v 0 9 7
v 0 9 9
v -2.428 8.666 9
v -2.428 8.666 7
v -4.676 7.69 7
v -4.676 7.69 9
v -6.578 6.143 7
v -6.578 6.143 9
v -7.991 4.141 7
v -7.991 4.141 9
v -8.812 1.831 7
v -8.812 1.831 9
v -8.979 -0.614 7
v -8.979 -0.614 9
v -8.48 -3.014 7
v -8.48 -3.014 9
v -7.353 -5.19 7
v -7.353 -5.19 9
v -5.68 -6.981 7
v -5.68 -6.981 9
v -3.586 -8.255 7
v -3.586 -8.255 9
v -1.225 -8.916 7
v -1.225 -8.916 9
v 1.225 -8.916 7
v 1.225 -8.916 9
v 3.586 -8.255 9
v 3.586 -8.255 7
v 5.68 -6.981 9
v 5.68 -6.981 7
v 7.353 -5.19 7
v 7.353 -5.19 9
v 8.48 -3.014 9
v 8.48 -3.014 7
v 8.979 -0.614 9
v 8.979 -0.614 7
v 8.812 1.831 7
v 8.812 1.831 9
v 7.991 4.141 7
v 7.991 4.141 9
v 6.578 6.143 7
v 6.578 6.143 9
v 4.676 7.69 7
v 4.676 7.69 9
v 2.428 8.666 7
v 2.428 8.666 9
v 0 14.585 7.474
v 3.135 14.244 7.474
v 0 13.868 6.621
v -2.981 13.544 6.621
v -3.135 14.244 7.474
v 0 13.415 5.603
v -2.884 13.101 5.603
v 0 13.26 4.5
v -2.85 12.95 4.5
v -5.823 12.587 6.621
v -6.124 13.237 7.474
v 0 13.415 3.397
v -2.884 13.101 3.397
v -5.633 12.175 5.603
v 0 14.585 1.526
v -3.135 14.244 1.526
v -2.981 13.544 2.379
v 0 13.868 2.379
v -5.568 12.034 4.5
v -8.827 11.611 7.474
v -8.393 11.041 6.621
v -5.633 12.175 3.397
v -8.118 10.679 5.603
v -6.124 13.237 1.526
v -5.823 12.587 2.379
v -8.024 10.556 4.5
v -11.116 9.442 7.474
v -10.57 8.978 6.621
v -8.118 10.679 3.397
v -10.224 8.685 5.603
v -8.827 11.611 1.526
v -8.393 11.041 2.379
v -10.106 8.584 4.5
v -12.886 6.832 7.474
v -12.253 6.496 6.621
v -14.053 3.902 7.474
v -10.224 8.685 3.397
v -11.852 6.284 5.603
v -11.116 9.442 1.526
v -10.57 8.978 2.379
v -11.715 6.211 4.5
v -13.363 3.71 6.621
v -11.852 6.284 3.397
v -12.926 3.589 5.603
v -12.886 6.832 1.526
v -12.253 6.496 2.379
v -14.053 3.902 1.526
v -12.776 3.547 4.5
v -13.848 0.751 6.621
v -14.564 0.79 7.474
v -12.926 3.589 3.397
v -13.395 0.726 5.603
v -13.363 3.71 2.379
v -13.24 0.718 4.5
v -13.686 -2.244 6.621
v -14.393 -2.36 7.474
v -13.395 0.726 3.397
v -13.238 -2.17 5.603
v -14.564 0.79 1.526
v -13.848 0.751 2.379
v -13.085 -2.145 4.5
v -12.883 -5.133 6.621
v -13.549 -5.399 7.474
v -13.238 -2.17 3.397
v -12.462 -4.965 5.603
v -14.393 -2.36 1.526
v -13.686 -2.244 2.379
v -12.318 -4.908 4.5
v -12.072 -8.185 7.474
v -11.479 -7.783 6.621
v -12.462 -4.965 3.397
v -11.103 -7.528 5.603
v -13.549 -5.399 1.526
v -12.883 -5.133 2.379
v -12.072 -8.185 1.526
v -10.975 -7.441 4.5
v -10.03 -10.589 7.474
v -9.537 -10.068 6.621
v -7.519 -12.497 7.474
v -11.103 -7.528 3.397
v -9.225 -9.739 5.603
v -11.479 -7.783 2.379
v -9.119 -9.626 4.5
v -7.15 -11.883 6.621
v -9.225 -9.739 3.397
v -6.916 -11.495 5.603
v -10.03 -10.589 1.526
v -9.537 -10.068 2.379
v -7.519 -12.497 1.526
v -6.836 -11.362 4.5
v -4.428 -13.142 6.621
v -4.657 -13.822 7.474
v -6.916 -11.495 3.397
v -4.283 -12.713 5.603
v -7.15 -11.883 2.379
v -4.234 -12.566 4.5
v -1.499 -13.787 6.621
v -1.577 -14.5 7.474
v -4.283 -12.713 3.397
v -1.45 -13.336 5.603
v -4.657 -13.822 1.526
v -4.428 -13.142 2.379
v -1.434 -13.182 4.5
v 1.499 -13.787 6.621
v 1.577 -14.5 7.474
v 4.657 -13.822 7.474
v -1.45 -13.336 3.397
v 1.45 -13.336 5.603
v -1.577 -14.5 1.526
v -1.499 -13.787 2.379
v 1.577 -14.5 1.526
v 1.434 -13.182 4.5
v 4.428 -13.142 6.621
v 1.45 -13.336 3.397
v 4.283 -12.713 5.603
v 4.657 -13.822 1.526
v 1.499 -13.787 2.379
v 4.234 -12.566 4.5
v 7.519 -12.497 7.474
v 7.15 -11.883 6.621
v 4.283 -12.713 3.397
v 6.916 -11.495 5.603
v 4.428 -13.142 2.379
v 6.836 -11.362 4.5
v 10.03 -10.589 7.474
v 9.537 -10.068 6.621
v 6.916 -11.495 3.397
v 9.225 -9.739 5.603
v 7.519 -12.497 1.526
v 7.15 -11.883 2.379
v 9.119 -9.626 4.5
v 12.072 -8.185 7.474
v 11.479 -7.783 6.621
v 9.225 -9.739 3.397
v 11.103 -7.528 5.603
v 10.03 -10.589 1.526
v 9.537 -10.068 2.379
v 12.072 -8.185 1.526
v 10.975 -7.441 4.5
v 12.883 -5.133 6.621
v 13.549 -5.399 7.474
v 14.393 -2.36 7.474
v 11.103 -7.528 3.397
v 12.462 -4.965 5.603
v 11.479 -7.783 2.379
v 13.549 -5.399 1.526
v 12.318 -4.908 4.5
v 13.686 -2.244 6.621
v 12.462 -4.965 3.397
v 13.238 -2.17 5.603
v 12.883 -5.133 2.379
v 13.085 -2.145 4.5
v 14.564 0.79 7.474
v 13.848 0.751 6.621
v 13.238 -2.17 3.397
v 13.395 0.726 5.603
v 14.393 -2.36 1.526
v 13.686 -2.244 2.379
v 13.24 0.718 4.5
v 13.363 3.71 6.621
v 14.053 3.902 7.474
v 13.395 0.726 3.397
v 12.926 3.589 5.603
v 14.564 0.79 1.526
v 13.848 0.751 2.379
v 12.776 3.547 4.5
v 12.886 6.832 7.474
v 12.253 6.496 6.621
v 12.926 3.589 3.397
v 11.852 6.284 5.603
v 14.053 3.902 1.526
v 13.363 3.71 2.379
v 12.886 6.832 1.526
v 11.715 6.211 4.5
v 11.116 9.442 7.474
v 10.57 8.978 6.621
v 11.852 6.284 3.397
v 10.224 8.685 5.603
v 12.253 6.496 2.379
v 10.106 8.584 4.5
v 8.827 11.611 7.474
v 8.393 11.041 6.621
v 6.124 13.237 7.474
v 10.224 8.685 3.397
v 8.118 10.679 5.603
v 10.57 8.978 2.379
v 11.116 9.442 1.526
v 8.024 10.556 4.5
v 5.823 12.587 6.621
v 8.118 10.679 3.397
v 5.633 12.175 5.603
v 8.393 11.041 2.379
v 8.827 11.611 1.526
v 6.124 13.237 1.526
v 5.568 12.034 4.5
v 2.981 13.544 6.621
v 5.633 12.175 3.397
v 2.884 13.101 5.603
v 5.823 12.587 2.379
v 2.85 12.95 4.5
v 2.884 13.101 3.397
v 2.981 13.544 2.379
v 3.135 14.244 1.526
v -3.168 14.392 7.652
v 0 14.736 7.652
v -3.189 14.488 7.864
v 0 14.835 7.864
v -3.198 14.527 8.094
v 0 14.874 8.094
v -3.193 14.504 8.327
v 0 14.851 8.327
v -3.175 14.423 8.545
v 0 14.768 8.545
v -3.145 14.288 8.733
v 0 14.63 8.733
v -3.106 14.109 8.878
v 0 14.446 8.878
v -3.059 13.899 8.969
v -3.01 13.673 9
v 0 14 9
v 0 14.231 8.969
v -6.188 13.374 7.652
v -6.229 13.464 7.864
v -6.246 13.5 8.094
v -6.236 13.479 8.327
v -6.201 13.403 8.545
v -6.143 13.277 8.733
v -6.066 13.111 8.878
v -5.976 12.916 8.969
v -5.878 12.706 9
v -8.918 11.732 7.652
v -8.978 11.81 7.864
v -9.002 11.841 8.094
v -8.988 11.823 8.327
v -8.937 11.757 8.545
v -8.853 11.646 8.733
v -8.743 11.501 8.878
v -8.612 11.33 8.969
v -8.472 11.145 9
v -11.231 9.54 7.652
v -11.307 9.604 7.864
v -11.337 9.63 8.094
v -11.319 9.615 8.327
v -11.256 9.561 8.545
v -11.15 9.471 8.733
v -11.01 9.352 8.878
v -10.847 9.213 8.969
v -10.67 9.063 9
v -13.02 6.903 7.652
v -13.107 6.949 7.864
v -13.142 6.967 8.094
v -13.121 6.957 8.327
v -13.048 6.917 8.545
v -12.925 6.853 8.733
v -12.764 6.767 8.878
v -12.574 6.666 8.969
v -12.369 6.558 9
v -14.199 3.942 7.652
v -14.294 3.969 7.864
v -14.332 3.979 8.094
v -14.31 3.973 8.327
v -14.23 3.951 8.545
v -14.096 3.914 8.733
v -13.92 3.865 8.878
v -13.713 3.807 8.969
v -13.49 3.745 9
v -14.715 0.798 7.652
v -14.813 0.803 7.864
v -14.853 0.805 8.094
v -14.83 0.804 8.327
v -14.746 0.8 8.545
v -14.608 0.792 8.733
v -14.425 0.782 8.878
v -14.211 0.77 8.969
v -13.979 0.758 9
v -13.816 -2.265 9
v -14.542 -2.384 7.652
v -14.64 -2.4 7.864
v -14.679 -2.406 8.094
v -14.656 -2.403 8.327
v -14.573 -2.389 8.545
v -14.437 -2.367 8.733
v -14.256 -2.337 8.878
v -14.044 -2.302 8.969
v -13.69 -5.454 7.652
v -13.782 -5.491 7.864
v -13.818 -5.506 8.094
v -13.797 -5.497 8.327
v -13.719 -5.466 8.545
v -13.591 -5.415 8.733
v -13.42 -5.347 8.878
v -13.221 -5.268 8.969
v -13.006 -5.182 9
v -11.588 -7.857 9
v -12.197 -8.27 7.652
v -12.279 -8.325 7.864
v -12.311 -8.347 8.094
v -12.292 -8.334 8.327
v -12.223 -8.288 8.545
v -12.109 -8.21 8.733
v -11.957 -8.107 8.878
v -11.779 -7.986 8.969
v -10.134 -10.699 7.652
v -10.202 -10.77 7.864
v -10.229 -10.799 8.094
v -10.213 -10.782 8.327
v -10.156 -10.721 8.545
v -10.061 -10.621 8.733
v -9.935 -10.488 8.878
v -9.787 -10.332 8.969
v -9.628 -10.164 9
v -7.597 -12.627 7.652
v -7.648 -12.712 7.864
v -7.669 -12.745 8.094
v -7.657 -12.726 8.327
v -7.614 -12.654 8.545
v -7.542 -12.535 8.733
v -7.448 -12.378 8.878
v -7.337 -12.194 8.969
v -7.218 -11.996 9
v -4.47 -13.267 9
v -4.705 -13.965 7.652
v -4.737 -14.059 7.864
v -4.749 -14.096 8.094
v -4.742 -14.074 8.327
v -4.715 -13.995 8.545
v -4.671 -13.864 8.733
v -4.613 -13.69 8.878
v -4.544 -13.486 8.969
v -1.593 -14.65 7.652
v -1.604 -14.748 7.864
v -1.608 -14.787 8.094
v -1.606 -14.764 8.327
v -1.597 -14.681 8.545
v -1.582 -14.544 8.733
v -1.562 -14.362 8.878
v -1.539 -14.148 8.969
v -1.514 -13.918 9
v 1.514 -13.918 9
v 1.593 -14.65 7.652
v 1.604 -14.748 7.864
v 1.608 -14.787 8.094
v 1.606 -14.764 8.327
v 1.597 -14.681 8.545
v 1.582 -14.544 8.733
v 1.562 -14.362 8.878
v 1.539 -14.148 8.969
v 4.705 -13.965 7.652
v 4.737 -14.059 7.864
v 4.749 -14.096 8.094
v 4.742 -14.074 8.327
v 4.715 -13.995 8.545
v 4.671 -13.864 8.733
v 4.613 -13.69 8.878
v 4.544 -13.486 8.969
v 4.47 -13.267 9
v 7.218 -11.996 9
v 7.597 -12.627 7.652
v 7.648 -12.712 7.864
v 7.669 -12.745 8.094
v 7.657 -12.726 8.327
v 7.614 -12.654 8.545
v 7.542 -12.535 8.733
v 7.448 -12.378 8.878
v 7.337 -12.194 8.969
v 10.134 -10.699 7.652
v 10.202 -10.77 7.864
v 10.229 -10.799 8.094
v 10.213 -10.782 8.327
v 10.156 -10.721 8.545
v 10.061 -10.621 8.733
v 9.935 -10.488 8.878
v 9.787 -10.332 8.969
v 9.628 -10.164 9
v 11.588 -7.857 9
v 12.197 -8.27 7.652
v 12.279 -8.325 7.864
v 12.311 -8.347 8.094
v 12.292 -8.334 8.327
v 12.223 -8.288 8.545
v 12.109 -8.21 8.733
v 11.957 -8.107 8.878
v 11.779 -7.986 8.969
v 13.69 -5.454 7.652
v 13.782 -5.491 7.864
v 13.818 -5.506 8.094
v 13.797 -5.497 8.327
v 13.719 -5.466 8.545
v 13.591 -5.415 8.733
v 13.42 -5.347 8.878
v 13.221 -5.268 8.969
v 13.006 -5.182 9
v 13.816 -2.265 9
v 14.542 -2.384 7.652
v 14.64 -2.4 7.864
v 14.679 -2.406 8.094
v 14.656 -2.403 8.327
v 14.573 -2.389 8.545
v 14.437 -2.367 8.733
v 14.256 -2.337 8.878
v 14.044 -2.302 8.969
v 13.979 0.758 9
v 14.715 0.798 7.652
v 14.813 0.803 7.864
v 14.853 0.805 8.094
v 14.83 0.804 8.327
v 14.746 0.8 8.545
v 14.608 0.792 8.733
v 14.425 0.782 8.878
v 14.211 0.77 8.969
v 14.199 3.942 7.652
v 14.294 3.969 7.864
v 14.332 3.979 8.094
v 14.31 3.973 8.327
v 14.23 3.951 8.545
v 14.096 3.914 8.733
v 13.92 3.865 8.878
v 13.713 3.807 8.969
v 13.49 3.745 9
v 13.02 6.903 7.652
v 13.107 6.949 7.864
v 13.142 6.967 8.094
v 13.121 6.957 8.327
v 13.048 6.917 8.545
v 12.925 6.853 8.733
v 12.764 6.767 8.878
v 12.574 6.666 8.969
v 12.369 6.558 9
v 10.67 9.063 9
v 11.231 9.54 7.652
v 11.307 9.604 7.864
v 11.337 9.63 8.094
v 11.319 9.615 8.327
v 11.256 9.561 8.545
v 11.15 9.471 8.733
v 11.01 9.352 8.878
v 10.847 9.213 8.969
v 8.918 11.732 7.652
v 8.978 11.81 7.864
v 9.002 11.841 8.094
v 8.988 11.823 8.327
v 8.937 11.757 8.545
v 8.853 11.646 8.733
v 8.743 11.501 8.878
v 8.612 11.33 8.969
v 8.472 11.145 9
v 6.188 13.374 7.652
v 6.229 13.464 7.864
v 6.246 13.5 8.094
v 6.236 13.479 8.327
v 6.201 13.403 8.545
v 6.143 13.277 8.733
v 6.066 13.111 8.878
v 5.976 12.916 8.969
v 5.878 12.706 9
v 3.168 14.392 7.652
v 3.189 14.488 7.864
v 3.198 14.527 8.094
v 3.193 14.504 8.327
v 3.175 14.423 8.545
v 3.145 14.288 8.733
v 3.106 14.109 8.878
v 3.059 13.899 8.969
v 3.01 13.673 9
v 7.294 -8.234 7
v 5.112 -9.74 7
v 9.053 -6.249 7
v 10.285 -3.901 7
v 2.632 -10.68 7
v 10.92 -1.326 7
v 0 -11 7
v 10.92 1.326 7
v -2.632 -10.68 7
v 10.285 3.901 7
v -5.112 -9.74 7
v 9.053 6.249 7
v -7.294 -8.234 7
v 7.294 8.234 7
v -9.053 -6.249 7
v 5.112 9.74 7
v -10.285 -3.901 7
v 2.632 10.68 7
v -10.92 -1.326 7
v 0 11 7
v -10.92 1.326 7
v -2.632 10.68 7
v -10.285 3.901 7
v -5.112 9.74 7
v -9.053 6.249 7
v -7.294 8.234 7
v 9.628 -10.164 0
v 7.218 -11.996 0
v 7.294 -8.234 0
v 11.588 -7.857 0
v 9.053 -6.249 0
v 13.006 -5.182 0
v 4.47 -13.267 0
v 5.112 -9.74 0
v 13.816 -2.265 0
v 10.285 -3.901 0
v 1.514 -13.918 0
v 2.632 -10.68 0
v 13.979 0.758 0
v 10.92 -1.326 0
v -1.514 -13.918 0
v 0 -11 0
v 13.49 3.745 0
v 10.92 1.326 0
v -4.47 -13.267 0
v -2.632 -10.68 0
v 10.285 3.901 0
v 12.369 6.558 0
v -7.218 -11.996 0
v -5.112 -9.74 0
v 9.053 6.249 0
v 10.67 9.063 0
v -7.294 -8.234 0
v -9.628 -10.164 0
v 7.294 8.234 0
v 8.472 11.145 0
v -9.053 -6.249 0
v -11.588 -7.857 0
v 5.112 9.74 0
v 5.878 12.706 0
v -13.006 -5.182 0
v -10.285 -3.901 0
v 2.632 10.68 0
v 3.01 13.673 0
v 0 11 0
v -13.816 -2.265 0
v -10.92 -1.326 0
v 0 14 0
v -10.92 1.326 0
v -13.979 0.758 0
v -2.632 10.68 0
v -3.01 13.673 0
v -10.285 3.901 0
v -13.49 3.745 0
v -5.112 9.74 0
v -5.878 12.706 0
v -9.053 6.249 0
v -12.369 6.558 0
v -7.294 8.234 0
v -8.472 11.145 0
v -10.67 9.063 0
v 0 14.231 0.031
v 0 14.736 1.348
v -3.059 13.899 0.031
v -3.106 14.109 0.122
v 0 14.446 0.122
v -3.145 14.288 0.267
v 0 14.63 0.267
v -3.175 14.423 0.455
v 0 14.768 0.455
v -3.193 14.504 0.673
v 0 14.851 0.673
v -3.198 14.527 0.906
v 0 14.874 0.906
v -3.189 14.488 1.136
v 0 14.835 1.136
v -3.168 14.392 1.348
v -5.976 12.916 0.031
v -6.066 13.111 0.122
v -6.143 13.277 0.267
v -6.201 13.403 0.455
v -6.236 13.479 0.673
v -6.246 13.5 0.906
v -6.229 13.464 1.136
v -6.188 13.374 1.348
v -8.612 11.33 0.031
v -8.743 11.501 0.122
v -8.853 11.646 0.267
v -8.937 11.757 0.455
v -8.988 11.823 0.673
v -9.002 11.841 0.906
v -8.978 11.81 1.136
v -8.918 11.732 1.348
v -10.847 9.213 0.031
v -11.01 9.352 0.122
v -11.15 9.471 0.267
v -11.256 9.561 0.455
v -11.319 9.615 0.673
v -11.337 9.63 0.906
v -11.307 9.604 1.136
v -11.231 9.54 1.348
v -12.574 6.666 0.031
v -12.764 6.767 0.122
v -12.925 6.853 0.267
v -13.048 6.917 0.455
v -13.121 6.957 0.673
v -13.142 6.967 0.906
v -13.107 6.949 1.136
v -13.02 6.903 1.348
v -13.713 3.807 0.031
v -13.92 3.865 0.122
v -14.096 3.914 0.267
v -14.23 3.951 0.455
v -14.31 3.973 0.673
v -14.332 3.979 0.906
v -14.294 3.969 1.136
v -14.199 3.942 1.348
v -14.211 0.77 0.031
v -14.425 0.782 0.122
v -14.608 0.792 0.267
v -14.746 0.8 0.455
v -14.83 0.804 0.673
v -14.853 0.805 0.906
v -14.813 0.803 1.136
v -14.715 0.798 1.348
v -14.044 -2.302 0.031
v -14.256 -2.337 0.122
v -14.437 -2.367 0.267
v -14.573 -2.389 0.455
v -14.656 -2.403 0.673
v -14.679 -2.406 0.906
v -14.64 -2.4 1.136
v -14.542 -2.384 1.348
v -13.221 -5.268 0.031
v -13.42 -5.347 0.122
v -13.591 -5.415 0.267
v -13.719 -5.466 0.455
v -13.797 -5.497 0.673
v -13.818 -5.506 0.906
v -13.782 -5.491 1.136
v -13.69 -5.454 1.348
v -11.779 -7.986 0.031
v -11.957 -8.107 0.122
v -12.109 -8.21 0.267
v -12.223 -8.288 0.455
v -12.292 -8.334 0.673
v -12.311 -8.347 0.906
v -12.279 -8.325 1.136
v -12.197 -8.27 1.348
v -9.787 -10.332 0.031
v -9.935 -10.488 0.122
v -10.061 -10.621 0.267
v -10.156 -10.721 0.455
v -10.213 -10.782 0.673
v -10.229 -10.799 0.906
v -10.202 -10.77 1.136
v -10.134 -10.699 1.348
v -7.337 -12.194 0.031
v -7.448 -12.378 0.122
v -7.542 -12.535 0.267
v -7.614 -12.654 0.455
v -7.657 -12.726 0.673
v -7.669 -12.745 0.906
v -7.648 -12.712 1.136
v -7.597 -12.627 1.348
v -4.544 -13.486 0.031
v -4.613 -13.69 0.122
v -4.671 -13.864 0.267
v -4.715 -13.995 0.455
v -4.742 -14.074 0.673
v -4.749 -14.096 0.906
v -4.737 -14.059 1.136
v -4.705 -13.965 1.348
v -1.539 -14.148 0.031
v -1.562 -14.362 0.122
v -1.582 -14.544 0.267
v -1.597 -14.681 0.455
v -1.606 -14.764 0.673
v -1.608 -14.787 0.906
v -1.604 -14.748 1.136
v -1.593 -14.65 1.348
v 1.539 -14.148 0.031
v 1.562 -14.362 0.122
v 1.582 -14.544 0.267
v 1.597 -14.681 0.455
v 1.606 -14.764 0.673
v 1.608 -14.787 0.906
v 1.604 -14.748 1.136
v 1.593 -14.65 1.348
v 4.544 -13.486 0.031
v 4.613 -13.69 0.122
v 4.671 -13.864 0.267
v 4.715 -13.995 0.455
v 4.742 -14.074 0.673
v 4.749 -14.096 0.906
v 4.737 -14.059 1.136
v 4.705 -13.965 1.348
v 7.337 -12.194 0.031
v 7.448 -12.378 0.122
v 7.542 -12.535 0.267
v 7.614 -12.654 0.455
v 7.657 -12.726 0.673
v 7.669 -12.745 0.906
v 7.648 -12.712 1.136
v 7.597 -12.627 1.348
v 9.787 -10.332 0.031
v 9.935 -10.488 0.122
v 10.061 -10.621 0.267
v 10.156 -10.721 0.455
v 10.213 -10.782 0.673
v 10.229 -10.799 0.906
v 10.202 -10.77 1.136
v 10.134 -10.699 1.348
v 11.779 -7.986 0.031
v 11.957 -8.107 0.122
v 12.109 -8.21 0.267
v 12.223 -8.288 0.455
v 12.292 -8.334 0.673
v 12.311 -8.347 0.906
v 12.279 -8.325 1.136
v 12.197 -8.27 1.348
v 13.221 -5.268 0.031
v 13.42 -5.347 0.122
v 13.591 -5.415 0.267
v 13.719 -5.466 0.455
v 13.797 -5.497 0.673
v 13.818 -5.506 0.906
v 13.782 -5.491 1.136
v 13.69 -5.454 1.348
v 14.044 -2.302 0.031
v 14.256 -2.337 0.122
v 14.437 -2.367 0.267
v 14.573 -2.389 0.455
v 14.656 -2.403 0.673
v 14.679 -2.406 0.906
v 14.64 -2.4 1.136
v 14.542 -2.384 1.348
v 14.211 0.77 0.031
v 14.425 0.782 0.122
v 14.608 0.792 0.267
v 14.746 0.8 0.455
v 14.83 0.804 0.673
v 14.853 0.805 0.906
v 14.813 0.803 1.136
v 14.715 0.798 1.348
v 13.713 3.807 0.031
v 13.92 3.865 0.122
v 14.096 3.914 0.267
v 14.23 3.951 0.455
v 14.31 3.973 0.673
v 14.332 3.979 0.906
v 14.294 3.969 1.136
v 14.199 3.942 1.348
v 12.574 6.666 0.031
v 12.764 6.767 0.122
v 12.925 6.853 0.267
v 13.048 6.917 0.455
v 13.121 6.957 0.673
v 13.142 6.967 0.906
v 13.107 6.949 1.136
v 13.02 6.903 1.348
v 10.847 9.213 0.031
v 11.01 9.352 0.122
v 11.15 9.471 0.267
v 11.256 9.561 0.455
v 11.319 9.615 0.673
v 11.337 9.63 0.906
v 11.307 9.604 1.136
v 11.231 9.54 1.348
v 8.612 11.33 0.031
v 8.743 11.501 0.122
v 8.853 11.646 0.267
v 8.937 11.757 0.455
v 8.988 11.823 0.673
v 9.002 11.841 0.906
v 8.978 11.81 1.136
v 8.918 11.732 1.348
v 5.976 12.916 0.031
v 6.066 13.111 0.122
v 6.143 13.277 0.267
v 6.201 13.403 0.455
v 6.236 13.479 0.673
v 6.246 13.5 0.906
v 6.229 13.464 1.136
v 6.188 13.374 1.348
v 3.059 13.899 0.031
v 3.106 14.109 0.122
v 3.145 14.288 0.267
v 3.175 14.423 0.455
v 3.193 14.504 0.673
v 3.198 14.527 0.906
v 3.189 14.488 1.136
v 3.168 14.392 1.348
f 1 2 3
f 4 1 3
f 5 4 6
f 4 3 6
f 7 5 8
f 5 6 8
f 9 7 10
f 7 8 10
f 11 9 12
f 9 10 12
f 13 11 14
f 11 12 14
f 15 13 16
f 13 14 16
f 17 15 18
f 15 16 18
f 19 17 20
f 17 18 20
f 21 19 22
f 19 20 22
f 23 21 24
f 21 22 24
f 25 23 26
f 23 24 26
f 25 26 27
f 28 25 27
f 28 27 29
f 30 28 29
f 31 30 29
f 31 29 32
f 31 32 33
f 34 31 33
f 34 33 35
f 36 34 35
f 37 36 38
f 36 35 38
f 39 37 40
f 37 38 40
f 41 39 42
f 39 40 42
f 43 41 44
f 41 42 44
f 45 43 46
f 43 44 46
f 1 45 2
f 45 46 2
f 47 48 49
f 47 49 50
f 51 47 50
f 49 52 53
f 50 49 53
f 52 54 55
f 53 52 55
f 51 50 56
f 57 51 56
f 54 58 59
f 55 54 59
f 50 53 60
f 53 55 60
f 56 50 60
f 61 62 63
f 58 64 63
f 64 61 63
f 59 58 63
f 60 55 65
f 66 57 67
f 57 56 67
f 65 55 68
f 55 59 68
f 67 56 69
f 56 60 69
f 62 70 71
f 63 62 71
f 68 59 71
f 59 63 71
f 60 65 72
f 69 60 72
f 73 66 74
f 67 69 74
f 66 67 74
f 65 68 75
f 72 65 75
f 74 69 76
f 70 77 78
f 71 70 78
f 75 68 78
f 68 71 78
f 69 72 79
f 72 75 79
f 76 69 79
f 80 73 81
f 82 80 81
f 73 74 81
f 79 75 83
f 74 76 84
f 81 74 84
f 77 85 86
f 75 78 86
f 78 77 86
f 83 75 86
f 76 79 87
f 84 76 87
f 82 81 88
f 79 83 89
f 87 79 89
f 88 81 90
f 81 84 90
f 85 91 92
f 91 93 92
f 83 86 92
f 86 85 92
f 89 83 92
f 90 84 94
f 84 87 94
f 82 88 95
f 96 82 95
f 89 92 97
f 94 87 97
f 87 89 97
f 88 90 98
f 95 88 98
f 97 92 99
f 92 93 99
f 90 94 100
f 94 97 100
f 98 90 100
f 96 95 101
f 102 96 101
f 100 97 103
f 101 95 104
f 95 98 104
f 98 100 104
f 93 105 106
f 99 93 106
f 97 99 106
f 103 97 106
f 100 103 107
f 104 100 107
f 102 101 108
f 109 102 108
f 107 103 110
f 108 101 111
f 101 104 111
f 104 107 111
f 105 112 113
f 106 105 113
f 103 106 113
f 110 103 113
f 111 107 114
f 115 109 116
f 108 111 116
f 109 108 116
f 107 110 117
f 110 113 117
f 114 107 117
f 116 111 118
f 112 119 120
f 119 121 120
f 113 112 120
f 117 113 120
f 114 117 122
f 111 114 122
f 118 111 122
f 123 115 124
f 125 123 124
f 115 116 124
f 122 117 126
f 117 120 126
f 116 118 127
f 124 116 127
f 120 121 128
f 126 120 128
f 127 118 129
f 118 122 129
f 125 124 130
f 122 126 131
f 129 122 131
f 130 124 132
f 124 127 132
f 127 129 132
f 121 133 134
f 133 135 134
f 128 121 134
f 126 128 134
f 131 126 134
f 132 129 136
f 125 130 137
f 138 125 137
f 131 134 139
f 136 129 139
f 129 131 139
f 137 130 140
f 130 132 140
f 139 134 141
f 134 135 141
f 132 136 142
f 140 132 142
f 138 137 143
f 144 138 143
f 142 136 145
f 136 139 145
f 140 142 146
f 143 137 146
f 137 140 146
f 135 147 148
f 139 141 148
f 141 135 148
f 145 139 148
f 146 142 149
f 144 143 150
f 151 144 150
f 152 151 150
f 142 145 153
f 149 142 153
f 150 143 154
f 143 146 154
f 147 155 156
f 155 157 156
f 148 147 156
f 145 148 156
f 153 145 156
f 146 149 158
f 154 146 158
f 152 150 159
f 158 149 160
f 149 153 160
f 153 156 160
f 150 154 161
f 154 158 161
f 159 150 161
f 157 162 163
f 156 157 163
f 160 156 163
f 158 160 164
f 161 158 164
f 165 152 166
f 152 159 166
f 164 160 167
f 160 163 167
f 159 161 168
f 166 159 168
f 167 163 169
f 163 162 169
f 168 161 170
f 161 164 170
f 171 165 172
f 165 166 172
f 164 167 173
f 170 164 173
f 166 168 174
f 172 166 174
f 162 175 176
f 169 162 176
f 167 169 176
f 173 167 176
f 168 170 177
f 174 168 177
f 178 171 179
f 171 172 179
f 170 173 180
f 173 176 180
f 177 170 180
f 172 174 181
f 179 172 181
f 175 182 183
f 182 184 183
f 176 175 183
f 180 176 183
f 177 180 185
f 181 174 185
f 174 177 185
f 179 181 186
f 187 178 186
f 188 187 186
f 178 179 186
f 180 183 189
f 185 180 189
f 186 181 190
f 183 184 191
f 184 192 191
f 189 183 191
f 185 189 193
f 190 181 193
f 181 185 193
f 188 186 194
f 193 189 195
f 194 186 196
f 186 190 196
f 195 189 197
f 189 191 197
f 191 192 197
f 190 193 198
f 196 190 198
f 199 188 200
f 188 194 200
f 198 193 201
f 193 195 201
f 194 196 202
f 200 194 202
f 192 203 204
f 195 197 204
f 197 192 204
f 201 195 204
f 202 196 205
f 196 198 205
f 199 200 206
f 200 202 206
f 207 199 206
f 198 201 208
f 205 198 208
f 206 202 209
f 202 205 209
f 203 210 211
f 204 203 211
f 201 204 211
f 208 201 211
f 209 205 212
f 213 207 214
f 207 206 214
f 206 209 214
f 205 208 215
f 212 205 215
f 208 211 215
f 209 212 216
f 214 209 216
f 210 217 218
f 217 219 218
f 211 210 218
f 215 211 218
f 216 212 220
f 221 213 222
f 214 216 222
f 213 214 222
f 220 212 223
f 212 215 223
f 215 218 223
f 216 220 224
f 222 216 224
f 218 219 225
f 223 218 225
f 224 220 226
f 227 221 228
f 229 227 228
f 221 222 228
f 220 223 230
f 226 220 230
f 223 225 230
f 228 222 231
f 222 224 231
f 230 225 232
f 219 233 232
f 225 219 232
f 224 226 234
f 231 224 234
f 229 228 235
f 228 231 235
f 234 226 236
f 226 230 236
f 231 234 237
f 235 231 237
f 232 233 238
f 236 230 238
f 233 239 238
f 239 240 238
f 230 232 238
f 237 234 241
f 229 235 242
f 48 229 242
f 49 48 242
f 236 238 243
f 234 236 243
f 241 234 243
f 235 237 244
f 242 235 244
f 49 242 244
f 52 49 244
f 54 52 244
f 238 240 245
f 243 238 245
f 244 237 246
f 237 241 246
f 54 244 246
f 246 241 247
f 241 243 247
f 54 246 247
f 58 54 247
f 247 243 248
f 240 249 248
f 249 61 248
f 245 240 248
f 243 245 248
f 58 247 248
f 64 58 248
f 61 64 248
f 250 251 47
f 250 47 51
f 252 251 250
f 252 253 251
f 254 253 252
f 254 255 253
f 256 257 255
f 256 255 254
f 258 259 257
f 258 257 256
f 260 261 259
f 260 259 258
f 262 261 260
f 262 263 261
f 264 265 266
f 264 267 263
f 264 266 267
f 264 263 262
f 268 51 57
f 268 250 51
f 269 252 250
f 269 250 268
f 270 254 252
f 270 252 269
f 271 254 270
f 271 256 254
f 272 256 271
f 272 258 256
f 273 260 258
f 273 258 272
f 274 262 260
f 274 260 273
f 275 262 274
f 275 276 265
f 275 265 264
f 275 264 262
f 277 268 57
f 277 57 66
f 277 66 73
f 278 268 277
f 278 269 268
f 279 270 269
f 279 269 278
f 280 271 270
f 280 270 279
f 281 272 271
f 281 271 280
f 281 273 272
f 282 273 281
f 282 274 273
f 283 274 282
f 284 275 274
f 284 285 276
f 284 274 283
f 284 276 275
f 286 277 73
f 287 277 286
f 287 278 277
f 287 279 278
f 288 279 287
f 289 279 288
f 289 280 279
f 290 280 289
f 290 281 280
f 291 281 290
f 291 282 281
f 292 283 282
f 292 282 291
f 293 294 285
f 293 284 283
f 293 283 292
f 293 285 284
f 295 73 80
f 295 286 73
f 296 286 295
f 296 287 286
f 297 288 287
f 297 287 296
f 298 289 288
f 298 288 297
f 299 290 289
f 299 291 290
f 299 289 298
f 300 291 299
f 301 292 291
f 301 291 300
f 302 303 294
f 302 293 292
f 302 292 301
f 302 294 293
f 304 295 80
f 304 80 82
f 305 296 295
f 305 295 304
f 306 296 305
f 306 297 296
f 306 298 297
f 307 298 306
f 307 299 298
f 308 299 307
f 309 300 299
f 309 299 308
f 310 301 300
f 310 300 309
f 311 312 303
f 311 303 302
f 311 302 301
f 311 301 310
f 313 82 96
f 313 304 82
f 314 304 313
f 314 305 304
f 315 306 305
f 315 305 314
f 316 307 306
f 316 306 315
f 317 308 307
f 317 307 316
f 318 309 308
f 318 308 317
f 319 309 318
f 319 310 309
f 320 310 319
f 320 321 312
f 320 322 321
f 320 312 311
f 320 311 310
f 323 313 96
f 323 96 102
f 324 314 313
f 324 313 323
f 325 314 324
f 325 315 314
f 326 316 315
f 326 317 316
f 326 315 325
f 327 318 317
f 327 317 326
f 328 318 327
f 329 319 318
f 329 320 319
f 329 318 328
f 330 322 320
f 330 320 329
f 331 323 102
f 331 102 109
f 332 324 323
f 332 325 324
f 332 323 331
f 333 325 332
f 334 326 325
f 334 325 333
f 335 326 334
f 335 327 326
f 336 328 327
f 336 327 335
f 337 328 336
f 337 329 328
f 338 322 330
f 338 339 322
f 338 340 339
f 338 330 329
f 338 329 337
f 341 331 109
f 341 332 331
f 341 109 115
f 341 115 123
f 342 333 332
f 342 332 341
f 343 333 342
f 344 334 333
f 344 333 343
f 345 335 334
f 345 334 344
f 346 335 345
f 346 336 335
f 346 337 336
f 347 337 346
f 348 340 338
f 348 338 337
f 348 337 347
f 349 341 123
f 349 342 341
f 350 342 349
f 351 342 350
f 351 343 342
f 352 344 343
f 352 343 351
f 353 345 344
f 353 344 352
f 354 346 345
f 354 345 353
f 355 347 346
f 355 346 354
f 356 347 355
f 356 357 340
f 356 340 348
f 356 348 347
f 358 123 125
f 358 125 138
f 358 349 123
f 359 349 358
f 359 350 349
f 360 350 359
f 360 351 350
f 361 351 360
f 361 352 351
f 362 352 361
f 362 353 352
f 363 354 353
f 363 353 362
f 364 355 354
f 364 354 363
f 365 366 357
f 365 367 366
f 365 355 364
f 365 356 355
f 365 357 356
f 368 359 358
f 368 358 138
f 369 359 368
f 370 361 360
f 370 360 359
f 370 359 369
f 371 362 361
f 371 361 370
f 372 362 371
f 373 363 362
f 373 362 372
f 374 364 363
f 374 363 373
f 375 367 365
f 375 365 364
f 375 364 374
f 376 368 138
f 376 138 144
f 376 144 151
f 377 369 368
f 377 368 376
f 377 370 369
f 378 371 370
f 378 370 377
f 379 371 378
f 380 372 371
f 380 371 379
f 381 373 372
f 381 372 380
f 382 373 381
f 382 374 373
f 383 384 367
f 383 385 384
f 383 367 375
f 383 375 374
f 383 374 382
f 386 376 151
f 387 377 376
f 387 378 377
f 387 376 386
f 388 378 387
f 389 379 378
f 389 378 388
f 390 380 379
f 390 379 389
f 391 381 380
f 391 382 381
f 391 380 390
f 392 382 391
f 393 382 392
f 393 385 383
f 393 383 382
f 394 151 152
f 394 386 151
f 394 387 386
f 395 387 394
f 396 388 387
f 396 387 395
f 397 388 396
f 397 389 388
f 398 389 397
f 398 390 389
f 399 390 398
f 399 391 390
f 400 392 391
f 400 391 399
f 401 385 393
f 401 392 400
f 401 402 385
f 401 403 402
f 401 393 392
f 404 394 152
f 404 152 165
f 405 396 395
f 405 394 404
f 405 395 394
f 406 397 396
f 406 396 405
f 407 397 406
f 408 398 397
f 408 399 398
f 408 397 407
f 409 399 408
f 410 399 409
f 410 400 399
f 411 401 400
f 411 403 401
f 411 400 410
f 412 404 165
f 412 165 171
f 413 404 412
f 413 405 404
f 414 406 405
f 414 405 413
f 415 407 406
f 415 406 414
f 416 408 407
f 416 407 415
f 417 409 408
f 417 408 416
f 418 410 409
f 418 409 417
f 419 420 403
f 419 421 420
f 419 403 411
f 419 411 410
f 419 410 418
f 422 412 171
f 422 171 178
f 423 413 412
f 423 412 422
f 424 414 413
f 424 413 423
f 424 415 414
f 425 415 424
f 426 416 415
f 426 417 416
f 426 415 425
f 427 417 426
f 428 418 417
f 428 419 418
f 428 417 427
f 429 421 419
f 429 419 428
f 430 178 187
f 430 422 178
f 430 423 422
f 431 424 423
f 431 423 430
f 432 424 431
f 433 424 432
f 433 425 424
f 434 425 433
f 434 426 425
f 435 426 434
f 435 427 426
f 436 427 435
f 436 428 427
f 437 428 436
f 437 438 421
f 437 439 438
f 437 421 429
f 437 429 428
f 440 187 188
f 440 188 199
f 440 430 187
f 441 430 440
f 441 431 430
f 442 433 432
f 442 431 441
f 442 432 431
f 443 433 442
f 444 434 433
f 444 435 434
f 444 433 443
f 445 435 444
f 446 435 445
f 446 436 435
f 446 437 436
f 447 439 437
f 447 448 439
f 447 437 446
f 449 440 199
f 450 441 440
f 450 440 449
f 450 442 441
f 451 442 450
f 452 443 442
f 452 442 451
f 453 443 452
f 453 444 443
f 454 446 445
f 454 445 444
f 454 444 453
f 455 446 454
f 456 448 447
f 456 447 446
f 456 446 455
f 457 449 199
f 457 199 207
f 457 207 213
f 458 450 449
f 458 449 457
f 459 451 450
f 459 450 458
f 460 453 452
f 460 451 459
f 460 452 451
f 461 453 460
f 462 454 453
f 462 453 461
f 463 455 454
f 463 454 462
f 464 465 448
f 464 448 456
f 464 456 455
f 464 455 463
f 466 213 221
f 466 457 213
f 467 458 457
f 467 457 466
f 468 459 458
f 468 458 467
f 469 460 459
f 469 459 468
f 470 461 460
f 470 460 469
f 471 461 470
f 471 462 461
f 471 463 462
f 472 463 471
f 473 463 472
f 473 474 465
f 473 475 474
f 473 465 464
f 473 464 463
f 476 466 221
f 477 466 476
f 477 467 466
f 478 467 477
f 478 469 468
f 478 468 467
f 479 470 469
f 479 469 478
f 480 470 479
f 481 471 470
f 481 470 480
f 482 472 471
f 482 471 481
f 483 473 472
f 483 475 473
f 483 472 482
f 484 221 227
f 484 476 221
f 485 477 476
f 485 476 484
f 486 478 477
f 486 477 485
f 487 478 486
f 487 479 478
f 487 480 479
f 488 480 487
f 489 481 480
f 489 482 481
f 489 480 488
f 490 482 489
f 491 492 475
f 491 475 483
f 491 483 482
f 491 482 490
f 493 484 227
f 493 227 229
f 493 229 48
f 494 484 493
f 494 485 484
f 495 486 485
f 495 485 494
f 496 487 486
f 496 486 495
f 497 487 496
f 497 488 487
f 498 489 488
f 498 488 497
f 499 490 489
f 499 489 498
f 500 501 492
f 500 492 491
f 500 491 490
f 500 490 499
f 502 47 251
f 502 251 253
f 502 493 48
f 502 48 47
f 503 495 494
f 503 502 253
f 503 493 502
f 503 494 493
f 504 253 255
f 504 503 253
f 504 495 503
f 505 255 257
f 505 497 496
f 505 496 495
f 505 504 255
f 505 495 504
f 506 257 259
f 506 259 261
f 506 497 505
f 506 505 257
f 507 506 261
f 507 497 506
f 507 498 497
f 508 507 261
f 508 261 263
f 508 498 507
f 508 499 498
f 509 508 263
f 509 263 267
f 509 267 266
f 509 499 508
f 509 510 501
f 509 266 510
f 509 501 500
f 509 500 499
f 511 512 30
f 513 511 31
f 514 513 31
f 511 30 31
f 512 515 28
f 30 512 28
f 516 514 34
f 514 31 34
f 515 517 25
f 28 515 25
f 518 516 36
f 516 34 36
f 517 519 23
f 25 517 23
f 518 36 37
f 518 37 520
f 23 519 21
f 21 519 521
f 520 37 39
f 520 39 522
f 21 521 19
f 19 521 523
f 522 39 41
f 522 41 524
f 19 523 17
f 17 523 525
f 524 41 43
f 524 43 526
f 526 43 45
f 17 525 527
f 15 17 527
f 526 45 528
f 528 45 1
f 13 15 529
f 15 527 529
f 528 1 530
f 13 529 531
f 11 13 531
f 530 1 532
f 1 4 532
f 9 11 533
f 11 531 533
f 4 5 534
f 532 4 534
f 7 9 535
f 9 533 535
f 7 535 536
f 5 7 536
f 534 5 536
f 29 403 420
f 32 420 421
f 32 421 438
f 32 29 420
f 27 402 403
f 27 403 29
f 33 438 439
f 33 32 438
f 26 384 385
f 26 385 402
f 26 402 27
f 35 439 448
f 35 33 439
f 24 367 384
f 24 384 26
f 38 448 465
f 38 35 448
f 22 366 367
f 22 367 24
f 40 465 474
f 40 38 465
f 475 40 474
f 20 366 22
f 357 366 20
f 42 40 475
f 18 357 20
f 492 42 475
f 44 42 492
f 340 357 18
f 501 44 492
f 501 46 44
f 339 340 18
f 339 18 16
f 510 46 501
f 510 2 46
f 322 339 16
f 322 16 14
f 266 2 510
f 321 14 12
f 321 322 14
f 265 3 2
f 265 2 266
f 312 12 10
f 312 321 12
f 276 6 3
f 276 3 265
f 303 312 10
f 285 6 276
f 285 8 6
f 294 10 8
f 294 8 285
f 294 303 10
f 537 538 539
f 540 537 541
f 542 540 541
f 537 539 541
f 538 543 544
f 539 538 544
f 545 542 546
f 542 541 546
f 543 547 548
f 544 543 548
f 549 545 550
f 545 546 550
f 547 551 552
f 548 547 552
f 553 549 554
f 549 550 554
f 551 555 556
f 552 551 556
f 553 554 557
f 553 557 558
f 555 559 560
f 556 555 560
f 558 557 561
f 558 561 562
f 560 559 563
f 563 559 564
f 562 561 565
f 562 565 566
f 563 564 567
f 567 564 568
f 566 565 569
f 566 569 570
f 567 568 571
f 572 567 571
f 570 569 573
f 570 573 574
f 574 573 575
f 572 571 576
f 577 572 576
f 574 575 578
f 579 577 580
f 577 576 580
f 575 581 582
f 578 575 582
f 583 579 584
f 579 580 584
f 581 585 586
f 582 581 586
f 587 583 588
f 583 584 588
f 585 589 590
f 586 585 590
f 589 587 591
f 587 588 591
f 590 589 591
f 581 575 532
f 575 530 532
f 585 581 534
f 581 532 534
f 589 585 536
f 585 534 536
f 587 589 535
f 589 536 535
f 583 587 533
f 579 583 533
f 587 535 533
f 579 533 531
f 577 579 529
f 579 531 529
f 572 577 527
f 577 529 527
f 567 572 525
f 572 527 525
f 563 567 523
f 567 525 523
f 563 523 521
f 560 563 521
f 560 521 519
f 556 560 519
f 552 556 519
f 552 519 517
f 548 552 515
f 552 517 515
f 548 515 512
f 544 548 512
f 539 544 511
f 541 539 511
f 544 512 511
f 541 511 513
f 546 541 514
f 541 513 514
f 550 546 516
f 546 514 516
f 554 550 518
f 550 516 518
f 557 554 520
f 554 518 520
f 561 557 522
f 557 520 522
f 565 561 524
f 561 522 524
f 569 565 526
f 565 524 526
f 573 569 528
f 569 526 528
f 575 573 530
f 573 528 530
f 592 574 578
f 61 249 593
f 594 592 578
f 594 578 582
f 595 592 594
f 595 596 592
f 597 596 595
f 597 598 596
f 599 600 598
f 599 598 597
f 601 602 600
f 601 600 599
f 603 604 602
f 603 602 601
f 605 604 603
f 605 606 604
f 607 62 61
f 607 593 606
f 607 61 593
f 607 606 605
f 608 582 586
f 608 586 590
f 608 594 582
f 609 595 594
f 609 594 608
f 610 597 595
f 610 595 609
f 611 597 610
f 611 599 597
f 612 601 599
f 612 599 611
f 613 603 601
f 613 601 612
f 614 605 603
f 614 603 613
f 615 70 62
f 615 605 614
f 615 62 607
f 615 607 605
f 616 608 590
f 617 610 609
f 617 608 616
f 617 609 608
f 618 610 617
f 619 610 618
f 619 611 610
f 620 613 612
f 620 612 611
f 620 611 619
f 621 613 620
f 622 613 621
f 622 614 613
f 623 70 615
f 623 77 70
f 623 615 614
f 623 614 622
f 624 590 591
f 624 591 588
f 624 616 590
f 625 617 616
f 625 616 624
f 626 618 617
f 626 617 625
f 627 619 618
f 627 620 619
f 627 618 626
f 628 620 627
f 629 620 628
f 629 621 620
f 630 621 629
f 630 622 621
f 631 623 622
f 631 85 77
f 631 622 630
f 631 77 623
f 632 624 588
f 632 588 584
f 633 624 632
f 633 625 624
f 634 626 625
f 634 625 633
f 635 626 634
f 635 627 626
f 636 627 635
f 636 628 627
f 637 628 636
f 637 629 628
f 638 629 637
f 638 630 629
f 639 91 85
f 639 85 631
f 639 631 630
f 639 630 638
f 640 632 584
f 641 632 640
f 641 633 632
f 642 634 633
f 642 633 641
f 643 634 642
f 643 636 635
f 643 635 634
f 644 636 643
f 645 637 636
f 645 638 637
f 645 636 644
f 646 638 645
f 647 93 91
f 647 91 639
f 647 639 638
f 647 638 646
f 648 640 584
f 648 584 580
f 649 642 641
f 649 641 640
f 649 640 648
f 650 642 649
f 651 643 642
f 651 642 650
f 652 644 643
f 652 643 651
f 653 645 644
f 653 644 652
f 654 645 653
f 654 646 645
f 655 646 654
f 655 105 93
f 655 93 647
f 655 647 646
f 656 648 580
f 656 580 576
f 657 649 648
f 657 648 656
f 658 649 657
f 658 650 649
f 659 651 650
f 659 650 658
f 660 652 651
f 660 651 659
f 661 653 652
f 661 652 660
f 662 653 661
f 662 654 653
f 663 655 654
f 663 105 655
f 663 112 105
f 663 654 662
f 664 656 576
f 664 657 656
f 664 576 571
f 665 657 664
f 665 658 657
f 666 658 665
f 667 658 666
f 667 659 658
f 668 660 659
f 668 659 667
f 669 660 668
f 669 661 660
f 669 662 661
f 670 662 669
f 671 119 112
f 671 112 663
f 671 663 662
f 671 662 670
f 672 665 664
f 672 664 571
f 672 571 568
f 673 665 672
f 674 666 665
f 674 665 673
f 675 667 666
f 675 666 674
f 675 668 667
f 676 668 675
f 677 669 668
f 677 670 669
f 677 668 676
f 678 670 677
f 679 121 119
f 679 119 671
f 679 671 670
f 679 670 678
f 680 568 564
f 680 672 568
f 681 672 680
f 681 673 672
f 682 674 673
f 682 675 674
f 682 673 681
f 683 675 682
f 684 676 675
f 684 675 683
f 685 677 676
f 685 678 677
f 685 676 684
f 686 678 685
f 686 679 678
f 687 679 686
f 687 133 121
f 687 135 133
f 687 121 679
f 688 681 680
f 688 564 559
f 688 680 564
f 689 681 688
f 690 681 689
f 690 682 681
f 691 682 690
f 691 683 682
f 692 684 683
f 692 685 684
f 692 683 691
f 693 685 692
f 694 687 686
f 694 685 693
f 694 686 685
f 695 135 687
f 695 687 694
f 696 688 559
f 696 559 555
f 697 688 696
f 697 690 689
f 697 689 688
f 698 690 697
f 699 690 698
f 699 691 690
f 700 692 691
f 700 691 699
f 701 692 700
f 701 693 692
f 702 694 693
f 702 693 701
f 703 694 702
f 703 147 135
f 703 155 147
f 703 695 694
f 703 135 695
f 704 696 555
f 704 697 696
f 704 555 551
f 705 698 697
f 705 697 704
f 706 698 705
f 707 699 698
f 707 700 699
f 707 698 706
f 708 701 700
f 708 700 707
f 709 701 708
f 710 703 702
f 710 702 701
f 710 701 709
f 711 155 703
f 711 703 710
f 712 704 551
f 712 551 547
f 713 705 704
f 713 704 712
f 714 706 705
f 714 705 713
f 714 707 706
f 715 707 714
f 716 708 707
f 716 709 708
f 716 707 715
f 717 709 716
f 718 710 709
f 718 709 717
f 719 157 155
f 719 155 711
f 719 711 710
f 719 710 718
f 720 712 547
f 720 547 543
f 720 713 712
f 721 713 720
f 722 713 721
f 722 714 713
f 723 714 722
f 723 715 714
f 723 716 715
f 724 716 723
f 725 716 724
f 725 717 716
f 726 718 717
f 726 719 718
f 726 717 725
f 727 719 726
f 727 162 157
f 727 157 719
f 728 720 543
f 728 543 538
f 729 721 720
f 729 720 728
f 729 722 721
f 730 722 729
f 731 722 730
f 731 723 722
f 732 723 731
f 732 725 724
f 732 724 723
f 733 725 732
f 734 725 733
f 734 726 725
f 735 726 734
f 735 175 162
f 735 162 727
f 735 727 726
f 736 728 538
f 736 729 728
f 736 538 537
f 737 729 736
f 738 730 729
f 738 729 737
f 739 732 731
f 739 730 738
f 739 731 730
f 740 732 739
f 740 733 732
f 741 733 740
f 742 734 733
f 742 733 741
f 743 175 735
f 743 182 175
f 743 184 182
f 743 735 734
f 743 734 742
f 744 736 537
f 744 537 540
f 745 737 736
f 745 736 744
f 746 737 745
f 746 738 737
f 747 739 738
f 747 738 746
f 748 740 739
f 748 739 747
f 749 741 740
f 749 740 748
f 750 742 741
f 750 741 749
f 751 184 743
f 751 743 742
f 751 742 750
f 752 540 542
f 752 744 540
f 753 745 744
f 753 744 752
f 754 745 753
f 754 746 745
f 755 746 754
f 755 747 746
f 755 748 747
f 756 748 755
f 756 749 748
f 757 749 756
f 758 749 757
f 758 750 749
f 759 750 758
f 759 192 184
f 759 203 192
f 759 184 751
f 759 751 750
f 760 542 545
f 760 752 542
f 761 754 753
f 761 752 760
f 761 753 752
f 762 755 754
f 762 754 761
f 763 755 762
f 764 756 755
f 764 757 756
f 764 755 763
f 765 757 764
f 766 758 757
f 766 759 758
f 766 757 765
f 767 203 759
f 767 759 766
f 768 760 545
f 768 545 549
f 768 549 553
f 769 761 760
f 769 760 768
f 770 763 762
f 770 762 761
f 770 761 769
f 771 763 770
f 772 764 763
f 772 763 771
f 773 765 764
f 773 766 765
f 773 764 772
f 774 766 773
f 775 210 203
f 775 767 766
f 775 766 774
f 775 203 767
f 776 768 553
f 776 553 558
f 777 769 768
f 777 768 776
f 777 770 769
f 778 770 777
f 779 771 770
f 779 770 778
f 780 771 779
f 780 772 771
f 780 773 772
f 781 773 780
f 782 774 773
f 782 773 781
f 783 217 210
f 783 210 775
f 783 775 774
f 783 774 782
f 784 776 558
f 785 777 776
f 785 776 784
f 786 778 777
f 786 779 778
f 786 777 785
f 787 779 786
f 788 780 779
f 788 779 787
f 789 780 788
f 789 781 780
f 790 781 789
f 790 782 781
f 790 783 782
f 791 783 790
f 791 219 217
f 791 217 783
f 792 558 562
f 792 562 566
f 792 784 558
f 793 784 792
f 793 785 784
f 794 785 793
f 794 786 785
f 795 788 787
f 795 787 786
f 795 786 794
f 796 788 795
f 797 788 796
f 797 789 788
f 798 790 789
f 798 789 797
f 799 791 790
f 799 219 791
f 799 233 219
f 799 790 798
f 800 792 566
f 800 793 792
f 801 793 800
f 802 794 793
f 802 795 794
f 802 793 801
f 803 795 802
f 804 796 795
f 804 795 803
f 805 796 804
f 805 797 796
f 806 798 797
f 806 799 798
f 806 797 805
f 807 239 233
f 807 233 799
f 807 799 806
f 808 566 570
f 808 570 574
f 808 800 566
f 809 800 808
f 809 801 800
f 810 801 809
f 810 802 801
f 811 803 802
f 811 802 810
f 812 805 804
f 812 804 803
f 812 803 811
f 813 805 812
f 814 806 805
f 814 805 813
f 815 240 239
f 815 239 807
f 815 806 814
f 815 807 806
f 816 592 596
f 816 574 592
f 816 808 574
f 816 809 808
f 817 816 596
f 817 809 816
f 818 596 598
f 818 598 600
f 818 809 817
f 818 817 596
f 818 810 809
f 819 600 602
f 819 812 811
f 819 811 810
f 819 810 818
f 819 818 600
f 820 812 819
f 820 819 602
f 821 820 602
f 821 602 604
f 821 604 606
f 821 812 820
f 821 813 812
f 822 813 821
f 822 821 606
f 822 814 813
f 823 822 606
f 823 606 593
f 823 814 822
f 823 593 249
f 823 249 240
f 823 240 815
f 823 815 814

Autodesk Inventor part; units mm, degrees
ref_plane "YZ Plane" through (0, 0, 0) normal (1, 0, 0) x (0, 1, 0)
ref_plane "XZ Plane" through (0, 0, 0) normal (0, 1, 0) x (-1, 0, 0)
ref_plane "XY Plane" through (0, 0, 0) normal (0, 0, 1) x (1, 0, 0)
sketch "Sketch1" plane through (0, 0, 0) normal (1, 0, 0) x (0, 1, 0)
  line L0 (0, 0) -> (0, 7) construction
  line L1 (11, 0) -> (11, 7)
  line L2 (11, 7) -> (9, 7)
  line L3 (9, 7) -> (9, 9)
  line L4 (9, 9) -> (14, 9)
  line L5 (11, 0) -> (14, 0)
  arc A0 (14.5851, 7.4744) -> (14, 9) centre (14, 8.125) ccw
  arc A1 (14.5851, 7.4744) -> (14.5851, 1.5256) centre (17.2596, 4.5) ccw
  arc A2 (14, 0) -> (14.5851, 1.5256) centre (14, 0.875) ccw
  line L6 (14.875, 0.875) -> (14.875, -2.7883) construction
  line L7 (13.2596, 4.5) -> (13.2596, 8) construction
  dimension "d0" = 7
  dimension "d1" = 11
  dimension "d2" = 2
  dimension "d3" = 2
  dimension "d5" = 3
  dimension "d6" = 4
  dimension "d7" = 0.875
  dimension "d9" = 13.2596
  dimension "d10" = 14.875
revolve "Revolution1" add sketch "Sketch1" angle 360 about axis through (0, 0, 0) along (0, 0, 1)
properties part number "bearingPulley"
